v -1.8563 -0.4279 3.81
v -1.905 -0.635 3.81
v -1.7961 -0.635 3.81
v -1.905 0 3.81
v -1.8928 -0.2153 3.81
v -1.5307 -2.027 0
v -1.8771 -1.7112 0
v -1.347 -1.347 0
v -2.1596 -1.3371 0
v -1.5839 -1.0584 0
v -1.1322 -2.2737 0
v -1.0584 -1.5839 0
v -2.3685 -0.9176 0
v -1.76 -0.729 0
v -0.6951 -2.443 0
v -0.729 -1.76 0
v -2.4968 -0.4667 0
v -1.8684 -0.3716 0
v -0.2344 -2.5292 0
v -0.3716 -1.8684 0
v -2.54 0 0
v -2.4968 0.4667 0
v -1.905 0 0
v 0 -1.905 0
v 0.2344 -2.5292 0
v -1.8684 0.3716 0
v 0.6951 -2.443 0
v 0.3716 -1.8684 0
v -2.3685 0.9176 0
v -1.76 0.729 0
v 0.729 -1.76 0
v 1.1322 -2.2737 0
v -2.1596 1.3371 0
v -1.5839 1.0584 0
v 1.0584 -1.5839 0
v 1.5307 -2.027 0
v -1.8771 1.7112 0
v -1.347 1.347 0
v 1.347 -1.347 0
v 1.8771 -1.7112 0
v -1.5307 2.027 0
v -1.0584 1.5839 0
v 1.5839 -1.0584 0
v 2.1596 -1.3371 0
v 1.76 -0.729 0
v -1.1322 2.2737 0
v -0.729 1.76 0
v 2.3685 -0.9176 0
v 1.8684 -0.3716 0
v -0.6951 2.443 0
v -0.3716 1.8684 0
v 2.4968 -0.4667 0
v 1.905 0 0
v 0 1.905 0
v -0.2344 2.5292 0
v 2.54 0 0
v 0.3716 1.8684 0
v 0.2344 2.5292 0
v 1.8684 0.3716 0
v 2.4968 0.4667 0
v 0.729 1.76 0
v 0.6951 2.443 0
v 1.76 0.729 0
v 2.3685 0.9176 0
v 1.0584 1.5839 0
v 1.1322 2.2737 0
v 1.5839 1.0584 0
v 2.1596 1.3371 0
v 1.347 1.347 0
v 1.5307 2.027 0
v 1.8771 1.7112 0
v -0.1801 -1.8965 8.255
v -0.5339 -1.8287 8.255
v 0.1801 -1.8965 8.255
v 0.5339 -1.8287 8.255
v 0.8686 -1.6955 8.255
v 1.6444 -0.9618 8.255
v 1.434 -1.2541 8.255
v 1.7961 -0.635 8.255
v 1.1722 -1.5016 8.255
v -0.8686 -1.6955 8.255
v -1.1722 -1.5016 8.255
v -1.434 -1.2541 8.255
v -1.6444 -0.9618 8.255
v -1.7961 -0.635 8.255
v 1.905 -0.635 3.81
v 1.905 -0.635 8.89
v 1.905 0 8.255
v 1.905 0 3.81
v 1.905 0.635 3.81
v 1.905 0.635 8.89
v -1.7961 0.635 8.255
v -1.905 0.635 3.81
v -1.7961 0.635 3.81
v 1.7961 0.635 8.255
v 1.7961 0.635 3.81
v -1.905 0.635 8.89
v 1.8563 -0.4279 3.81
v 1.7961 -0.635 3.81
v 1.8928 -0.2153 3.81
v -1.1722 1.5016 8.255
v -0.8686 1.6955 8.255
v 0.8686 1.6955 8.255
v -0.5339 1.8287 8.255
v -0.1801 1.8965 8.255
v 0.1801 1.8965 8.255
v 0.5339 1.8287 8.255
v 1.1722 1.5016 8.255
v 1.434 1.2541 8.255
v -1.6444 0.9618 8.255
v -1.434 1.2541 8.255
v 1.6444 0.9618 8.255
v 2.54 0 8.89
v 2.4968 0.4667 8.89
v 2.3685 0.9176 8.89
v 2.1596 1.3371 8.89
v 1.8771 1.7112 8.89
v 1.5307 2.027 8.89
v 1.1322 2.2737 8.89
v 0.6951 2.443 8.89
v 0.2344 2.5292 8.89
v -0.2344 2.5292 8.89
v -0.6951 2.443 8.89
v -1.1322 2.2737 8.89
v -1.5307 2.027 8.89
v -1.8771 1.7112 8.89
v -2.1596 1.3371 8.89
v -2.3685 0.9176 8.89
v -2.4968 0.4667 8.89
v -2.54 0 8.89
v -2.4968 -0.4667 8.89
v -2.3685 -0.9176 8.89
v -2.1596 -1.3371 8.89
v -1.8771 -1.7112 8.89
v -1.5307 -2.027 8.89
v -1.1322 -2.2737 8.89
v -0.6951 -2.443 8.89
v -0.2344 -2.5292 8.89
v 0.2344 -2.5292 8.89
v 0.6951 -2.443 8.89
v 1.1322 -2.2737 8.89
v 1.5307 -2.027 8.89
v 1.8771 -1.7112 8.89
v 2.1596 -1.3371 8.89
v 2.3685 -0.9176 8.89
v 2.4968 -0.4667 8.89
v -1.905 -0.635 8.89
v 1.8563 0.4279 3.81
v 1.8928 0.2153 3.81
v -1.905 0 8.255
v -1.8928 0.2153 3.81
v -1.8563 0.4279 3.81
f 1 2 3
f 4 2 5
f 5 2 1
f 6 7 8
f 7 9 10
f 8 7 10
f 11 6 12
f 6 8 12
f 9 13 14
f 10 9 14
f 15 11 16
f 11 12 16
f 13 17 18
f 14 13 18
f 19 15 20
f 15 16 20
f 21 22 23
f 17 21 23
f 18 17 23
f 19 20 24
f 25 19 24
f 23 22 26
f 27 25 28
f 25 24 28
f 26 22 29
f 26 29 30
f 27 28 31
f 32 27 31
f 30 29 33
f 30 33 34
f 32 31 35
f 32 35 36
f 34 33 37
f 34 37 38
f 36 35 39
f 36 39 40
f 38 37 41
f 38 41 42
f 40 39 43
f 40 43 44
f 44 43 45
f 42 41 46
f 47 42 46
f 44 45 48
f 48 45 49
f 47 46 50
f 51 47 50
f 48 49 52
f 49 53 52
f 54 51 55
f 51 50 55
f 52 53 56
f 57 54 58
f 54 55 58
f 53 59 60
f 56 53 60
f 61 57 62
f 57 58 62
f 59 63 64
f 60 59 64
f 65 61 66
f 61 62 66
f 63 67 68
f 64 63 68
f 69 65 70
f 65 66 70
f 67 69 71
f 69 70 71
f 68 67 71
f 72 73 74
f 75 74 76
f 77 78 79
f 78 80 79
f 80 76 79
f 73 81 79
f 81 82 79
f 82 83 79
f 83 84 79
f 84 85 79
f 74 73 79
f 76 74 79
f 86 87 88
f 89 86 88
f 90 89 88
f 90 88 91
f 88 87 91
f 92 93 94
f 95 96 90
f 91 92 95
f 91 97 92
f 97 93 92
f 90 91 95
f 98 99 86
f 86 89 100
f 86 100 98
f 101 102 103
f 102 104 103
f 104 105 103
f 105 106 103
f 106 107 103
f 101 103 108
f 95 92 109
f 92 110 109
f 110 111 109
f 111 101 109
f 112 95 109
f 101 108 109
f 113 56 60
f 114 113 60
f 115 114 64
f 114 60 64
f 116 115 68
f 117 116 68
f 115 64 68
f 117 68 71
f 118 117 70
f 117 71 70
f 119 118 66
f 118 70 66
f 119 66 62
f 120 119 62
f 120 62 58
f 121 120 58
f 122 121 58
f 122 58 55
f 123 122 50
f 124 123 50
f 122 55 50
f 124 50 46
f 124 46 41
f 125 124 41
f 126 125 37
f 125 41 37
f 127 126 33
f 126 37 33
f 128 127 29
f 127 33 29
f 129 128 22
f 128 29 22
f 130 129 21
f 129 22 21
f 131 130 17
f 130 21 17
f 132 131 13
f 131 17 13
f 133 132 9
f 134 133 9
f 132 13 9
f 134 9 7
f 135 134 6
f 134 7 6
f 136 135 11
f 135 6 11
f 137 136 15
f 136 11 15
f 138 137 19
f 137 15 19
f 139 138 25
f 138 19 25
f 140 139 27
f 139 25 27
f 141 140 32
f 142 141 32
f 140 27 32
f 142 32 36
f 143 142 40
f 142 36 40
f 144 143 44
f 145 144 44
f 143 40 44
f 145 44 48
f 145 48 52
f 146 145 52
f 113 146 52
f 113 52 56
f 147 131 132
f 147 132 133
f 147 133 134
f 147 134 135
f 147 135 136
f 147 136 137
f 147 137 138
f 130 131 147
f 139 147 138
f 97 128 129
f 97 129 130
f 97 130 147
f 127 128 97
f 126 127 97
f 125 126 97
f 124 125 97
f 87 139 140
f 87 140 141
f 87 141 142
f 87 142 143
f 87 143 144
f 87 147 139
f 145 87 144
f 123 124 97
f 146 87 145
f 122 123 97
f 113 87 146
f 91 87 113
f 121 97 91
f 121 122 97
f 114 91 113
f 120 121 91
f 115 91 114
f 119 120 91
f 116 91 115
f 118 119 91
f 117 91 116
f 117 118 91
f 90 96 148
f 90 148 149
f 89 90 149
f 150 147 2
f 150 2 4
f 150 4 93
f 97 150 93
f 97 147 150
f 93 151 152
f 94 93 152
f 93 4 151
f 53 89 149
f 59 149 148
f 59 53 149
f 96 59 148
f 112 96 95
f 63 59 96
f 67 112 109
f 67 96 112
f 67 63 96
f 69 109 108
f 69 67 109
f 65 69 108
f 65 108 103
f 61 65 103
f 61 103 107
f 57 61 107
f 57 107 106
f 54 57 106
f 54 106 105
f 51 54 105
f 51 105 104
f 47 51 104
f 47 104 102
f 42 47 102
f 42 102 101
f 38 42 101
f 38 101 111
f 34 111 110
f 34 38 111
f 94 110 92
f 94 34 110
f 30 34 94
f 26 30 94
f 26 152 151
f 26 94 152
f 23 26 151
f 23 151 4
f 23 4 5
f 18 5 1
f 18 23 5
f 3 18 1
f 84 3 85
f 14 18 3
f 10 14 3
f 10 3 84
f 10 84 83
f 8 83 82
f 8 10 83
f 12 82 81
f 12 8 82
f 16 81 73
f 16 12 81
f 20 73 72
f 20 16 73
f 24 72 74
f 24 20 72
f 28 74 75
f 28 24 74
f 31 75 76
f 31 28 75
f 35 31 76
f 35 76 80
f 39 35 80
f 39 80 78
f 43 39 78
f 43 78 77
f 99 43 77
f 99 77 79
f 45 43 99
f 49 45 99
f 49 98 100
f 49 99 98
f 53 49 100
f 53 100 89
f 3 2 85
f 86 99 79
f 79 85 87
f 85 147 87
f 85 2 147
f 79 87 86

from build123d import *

# Parameters (mm, degrees)
F0_R     = 2.54
F1_DEPTH = 8.89
F2_T     = -0.635
F3_W     = 3.81
F3_H     = 1.27
F4_DEPTH = 5.08


with BuildPart() as f1:
    # F0 (on Top) → F1 (new body)
    with BuildSketch(Plane.XY):
        Circle(F0_R)
    extrude(amount=F1_DEPTH)

    # F2
    f2_openings = [f1.faces().sort_by_distance(p)[0] for p in [
        (0, 0, 0),
    ]]
    offset(amount=F2_T, openings=f2_openings)

    # F3 (on face) → F4 (cut)
    with BuildSketch(Plane.XY.offset(8.89)):
        Rectangle(F3_W, F3_H)
    extrude(amount=-F4_DEPTH, mode=Mode.SUBTRACT)


solid = f1.part
